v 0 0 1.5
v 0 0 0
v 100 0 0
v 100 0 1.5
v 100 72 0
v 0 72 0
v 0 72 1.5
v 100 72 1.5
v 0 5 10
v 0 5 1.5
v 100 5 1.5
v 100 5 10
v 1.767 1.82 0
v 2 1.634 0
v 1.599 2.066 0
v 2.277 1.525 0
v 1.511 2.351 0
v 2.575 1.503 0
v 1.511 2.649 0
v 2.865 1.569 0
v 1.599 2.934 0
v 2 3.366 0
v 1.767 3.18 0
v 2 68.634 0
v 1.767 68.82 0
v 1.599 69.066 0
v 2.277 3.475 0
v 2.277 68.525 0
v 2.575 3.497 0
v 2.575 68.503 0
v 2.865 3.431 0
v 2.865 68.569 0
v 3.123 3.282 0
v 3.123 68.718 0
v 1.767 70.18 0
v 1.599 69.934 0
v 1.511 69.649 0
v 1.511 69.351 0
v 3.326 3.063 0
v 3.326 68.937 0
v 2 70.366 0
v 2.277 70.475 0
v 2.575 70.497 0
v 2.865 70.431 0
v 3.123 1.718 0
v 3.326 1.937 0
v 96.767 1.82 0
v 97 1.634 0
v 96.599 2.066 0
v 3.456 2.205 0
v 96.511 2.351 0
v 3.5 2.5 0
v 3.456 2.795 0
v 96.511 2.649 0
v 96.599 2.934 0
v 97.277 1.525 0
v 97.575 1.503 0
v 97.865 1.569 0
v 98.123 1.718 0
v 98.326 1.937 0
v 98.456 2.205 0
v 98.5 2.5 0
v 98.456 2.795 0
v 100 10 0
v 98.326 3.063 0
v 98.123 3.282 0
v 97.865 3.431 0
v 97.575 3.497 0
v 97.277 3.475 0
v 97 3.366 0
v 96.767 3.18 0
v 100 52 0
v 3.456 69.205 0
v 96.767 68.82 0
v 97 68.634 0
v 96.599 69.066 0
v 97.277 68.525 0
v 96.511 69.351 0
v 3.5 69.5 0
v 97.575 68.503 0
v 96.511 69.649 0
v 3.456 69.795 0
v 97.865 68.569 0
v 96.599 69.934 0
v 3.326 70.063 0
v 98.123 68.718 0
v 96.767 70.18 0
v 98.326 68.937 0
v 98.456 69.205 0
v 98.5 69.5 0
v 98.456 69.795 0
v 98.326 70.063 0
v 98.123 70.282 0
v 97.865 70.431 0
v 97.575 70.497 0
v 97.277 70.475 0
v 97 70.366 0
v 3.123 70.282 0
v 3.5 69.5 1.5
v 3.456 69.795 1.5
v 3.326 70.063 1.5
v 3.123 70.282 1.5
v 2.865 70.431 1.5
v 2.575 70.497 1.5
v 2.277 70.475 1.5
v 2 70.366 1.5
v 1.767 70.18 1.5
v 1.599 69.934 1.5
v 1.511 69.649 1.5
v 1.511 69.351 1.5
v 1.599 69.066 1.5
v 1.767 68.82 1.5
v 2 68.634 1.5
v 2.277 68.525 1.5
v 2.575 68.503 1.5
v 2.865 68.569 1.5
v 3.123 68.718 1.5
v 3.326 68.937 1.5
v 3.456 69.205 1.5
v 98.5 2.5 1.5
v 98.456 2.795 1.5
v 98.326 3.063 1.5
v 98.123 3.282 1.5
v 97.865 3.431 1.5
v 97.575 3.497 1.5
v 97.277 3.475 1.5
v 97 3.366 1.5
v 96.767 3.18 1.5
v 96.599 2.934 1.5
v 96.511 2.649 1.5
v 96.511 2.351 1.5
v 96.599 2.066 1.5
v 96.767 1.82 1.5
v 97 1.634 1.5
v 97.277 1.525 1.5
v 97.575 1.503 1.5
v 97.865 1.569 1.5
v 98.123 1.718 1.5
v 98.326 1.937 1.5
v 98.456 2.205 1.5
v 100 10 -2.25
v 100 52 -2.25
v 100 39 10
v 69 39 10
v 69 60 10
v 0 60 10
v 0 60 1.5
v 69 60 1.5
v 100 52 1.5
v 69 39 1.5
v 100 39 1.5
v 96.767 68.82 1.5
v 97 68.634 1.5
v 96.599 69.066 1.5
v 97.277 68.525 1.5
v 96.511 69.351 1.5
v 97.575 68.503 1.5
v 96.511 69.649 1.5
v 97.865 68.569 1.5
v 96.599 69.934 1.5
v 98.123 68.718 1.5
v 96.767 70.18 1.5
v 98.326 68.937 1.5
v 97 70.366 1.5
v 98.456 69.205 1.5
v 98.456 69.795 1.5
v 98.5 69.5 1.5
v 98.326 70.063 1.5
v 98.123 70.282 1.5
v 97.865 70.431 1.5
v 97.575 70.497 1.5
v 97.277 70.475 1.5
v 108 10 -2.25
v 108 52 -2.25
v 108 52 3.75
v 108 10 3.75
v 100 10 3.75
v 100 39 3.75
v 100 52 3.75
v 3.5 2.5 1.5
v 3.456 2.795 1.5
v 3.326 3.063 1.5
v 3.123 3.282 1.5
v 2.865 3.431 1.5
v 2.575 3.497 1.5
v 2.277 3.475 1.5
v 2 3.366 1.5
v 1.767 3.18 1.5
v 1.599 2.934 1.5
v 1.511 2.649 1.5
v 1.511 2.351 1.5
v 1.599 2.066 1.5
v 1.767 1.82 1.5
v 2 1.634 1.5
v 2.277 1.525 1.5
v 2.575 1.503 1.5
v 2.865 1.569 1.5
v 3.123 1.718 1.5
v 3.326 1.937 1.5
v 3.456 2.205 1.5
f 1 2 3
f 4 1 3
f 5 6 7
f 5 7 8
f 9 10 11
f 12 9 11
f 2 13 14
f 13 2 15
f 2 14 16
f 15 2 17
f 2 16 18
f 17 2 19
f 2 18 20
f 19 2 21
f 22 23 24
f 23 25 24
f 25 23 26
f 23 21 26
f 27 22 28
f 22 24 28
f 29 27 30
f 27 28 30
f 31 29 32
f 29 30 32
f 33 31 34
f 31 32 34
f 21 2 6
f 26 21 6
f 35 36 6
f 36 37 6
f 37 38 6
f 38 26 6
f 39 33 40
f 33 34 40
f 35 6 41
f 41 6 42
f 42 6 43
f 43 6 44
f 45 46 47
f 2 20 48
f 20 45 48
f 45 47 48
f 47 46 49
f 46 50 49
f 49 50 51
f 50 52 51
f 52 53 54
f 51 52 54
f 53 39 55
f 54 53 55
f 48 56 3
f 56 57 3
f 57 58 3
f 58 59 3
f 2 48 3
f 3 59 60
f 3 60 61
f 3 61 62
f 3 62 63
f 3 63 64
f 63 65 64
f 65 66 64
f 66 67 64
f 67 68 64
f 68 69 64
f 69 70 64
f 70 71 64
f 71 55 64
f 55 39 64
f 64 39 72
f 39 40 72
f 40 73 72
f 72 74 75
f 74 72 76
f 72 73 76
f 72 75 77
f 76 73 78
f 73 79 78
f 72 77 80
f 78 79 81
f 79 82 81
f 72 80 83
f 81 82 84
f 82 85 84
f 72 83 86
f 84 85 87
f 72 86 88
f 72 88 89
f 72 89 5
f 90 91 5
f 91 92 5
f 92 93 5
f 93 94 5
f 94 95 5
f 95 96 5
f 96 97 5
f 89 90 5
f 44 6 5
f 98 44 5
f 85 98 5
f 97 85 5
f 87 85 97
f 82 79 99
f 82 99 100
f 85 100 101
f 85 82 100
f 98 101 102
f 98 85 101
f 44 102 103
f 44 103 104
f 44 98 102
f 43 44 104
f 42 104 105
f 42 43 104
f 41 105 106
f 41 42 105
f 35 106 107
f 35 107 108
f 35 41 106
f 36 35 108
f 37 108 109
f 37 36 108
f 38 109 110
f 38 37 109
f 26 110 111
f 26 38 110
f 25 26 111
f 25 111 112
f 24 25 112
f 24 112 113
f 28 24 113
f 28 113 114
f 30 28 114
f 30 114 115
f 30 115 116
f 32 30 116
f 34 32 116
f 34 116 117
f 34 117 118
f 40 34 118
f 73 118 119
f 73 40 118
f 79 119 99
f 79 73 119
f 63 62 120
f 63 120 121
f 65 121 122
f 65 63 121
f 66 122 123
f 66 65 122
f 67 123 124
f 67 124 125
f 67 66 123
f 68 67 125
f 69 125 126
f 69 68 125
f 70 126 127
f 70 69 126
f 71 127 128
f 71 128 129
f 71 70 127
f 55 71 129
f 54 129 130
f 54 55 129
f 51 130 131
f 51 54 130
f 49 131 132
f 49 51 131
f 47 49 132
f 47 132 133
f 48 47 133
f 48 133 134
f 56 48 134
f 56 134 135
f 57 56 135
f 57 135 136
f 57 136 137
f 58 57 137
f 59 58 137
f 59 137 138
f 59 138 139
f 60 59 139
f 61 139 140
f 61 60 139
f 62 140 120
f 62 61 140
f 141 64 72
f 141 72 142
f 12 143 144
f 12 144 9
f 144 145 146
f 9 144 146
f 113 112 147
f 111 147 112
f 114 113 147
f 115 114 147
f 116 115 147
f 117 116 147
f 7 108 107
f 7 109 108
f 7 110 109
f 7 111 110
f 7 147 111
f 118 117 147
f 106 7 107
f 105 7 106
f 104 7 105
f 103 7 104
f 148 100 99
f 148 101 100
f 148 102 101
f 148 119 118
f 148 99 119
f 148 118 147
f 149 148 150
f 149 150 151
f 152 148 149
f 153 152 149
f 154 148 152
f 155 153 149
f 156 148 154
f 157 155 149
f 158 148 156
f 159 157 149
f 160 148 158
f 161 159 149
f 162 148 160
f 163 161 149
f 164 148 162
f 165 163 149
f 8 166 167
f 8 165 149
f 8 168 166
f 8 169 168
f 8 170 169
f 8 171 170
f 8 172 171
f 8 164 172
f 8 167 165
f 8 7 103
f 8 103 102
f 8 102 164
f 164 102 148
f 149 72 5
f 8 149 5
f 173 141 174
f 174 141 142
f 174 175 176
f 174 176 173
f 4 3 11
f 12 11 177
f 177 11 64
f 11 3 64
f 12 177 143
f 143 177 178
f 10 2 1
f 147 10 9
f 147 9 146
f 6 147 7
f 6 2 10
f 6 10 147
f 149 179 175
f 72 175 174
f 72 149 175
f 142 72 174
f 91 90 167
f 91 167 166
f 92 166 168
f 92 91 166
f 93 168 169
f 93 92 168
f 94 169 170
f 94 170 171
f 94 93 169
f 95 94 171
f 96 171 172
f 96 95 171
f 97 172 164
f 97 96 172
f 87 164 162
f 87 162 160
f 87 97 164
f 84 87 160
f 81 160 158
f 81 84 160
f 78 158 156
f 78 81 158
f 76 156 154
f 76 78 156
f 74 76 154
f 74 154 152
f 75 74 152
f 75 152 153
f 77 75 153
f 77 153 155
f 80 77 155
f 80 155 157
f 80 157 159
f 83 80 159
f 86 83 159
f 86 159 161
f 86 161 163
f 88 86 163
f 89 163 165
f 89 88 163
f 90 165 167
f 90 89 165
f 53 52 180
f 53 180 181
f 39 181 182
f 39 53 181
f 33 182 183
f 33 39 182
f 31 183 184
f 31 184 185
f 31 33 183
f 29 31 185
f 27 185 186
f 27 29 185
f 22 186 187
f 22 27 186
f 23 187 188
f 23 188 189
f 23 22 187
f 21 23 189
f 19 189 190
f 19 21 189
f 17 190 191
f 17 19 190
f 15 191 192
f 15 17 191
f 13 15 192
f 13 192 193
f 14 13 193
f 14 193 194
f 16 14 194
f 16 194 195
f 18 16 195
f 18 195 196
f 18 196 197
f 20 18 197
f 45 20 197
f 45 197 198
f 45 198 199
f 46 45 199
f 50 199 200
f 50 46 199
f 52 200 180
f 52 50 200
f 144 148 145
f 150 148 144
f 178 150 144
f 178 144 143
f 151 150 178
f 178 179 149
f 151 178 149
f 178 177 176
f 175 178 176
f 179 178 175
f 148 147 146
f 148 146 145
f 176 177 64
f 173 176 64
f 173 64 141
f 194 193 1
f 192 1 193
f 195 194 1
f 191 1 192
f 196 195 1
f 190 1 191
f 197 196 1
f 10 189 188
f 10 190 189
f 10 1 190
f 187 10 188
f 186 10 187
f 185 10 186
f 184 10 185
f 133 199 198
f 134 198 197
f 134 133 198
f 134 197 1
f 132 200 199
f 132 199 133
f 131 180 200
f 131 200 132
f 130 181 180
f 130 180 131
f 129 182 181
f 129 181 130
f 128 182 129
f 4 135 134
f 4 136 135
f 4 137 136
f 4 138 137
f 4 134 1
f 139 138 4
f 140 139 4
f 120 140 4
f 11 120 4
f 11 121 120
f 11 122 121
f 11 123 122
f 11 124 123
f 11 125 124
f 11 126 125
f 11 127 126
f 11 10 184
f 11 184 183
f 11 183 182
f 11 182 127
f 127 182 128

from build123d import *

# Parameters (mm, degrees)
MAIN_W                        = 100
MAIN_H                        = 72
MAIN_R                        = 1
MAIN_EXTRUSION_DEPTH          = 1.5
BOTTOM_HOLE_DEPTH             = 8.5
IDE_CONNECTOR_SKETCH_W        = 6
IDE_CONNECTOR_SKETCH_H        = 42
IDE_CONNECTOR_EXTRUSION_DEPTH = 8


with BuildPart() as part:
    # Main → Main-Extrusion (new body)
    with BuildSketch(Plane.XY):
        with Locations((50, 36)):
            Rectangle(MAIN_W, MAIN_H)
        with Locations((2.5, 69.5)):
            Circle(MAIN_R, mode=Mode.SUBTRACT)
        with Locations((2.5, 2.5)):
            Circle(MAIN_R, mode=Mode.SUBTRACT)
        with Locations((97.5, 69.5)):
            Circle(MAIN_R, mode=Mode.SUBTRACT)
        with Locations((97.5, 2.5)):
            Circle(MAIN_R, mode=Mode.SUBTRACT)
    extrude(amount=MAIN_EXTRUSION_DEPTH)

    # Bottom-Hole-Sketch → Bottom-Hole (add)
    with BuildSketch(Plane.XY.offset(1.5)):
        Polygon((0, 60), (69, 60), (69, 39), (100, 39), (100, 5), (69, 5), (0, 5), align=None)
    extrude(amount=BOTTOM_HOLE_DEPTH)

    # Ide-Connector-Sketch → Ide-Connector-Extrusion (add)
    with BuildSketch(Plane(origin=(100, 0, 0), x_dir=(0, 0, -1), z_dir=(1, 0, 0))):
        with Locations((-0.75, 31)):
            Rectangle(IDE_CONNECTOR_SKETCH_W, IDE_CONNECTOR_SKETCH_H)
    extrude(amount=IDE_CONNECTOR_EXTRUSION_DEPTH)


solid = part.part
